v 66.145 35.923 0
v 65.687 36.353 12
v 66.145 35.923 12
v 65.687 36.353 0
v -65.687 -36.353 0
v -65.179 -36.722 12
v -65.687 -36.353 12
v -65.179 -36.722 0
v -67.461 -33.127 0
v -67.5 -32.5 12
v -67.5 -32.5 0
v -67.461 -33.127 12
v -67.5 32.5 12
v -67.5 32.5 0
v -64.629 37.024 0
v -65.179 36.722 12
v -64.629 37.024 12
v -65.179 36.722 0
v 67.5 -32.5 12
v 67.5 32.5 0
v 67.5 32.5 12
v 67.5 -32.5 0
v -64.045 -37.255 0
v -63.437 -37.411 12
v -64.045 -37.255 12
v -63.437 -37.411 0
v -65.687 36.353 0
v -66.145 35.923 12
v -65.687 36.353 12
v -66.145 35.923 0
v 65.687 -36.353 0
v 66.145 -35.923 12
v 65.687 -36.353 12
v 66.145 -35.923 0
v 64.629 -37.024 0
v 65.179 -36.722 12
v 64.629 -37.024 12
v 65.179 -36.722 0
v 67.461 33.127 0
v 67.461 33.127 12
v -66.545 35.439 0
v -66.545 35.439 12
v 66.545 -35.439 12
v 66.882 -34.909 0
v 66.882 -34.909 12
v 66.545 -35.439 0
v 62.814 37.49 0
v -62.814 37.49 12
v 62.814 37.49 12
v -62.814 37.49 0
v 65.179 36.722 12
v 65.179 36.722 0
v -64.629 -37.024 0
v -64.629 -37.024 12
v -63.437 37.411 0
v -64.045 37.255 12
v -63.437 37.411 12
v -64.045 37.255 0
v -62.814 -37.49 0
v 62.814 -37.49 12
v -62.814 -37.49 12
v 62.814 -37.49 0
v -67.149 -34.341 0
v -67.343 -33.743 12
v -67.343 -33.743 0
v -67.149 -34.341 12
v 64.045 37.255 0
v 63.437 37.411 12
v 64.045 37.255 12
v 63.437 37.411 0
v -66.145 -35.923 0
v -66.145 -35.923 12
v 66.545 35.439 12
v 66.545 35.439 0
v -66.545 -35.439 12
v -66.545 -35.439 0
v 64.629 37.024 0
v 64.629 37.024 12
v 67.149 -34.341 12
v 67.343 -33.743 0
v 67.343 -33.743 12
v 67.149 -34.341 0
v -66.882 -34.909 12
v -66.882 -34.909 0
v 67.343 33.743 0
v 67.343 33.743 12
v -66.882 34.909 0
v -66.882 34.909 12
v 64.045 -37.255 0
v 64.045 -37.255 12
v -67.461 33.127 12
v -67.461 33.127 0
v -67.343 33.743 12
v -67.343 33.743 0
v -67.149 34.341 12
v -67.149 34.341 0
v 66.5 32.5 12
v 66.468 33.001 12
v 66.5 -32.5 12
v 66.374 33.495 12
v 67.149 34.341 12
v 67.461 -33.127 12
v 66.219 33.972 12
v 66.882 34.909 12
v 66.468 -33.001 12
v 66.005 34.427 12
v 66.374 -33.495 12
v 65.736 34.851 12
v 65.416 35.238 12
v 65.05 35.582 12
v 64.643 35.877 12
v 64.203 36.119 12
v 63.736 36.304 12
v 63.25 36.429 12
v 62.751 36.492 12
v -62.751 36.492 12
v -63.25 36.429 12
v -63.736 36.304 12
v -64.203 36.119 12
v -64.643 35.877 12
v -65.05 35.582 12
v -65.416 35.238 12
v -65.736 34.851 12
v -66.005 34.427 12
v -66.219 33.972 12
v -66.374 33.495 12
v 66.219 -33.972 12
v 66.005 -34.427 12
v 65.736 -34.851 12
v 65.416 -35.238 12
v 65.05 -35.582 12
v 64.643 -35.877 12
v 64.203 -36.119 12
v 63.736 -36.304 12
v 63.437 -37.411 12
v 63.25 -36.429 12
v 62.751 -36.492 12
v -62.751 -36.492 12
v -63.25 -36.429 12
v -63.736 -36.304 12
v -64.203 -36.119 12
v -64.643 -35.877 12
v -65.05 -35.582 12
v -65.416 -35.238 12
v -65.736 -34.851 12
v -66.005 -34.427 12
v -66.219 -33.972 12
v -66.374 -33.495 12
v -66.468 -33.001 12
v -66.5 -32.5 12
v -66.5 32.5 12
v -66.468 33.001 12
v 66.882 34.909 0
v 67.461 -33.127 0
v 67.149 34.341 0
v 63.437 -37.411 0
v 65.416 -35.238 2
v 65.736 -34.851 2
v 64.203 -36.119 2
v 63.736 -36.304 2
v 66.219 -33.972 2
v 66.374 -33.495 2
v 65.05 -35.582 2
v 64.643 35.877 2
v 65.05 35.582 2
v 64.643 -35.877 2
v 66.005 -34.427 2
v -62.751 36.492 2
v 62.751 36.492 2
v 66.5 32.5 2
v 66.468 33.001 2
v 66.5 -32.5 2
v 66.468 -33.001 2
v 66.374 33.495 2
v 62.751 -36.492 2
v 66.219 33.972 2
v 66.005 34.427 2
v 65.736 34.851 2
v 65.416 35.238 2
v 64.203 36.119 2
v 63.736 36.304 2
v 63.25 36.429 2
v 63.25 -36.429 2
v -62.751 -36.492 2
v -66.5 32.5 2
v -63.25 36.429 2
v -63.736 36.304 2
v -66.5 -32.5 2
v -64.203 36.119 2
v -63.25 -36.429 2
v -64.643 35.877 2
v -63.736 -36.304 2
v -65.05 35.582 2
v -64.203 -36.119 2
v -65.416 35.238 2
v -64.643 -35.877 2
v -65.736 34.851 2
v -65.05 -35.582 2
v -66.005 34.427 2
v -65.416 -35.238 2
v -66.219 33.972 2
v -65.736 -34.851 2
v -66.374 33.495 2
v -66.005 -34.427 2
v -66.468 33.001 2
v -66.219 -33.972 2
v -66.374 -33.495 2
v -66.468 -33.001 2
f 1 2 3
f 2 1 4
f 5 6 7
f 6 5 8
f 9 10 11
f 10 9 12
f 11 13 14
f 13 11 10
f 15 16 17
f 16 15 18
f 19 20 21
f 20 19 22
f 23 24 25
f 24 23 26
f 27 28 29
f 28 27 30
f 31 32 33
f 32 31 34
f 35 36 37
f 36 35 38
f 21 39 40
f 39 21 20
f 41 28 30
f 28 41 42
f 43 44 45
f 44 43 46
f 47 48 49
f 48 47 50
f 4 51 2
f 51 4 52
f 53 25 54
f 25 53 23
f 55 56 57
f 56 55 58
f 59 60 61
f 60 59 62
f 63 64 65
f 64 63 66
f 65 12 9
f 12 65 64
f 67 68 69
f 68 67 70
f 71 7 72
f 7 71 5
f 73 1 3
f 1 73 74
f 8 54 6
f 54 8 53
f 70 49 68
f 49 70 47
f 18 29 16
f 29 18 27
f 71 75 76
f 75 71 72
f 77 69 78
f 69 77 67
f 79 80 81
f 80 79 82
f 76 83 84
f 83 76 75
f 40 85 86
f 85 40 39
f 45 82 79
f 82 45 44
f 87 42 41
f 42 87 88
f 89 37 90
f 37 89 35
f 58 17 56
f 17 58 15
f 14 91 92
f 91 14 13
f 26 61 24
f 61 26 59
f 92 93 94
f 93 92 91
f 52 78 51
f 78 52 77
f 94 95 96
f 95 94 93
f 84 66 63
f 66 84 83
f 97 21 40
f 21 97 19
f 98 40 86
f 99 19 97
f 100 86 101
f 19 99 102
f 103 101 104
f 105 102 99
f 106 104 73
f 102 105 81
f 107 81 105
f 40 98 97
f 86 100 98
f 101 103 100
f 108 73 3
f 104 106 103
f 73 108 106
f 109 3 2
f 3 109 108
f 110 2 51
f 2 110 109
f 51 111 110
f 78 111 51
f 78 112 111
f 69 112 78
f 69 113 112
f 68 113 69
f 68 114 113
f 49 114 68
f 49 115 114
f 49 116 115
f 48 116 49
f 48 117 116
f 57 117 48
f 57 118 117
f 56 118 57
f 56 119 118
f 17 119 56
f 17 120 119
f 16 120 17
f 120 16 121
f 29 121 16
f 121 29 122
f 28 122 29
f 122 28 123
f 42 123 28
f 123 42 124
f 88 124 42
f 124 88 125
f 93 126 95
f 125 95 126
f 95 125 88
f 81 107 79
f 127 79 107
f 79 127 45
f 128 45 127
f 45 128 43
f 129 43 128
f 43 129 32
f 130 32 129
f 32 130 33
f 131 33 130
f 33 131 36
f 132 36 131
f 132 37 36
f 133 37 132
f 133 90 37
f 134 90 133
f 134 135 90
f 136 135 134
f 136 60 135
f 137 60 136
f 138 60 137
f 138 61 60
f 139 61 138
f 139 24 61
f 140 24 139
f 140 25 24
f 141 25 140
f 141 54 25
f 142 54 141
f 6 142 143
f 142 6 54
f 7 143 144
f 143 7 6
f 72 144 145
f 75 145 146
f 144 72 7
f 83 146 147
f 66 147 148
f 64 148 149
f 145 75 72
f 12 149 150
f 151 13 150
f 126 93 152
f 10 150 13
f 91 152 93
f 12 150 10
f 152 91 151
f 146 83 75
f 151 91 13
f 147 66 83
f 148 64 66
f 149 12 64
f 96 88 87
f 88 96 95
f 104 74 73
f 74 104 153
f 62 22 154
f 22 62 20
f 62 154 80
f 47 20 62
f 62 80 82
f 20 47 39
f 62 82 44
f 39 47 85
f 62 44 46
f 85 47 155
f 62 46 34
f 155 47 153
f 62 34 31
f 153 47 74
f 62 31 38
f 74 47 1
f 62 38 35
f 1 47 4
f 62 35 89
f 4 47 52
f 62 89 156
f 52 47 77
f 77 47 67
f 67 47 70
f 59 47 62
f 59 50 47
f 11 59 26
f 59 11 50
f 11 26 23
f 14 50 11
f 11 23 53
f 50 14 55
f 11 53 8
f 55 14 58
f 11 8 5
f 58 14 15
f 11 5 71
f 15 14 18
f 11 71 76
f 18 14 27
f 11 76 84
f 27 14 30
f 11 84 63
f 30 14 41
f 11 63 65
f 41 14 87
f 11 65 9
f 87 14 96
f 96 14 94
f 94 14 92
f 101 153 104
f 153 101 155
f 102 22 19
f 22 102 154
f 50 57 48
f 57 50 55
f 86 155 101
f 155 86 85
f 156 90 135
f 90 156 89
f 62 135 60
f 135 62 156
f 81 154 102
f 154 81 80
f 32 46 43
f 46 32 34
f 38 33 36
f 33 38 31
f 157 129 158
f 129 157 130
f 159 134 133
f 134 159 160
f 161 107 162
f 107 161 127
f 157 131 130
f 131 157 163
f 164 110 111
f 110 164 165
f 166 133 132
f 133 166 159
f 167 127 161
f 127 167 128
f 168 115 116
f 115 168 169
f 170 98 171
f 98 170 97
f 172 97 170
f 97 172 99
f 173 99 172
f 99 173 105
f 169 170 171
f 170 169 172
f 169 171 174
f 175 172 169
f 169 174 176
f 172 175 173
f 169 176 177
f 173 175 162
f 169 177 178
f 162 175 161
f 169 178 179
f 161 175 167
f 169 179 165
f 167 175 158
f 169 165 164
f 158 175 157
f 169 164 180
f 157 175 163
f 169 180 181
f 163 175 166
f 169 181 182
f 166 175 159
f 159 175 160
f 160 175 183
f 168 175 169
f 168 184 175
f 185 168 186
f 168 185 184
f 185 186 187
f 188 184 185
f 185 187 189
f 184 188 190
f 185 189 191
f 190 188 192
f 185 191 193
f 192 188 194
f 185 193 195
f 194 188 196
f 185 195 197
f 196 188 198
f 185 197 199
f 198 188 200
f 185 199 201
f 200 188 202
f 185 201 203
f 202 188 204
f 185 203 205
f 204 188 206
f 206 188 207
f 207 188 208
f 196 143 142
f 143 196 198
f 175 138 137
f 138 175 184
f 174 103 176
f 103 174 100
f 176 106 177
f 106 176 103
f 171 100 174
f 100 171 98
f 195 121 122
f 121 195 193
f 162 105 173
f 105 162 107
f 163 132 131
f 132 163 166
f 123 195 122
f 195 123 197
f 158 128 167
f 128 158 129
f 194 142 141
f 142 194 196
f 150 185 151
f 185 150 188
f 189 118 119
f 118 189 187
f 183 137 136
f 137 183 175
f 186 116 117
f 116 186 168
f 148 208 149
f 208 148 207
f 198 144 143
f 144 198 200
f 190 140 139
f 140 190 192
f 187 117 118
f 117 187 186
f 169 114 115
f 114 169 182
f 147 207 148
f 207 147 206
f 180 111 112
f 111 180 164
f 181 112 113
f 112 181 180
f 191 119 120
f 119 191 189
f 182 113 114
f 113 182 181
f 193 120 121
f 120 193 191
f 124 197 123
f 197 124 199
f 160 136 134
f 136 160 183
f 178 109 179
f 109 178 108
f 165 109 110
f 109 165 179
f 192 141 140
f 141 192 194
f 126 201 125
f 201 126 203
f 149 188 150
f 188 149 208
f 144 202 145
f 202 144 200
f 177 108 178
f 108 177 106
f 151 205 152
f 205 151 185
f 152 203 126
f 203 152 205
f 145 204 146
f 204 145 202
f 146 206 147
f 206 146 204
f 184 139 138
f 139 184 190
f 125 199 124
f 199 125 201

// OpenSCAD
$fn = 50;


difference() {
	union() {
		hull() {
			translate(v = [-62.5000000000, 32.5000000000, 0]) {
				cylinder(h = 12, r = 5);
			}
			translate(v = [62.5000000000, 32.5000000000, 0]) {
				cylinder(h = 12, r = 5);
			}
			translate(v = [-62.5000000000, -32.5000000000, 0]) {
				cylinder(h = 12, r = 5);
			}
			translate(v = [62.5000000000, -32.5000000000, 0]) {
				cylinder(h = 12, r = 5);
			}
		}
	}
	union() {
		translate(v = [0, 0, 2]) {
			hull() {
				translate(v = [-62.5000000000, 32.5000000000, 0]) {
					cylinder(h = 10, r = 4);
				}
				translate(v = [62.5000000000, 32.5000000000, 0]) {
					cylinder(h = 10, r = 4);
				}
				translate(v = [-62.5000000000, -32.5000000000, 0]) {
					cylinder(h = 10, r = 4);
				}
				translate(v = [62.5000000000, -32.5000000000, 0]) {
					cylinder(h = 10, r = 4);
				}
			}
		}
	}
}
